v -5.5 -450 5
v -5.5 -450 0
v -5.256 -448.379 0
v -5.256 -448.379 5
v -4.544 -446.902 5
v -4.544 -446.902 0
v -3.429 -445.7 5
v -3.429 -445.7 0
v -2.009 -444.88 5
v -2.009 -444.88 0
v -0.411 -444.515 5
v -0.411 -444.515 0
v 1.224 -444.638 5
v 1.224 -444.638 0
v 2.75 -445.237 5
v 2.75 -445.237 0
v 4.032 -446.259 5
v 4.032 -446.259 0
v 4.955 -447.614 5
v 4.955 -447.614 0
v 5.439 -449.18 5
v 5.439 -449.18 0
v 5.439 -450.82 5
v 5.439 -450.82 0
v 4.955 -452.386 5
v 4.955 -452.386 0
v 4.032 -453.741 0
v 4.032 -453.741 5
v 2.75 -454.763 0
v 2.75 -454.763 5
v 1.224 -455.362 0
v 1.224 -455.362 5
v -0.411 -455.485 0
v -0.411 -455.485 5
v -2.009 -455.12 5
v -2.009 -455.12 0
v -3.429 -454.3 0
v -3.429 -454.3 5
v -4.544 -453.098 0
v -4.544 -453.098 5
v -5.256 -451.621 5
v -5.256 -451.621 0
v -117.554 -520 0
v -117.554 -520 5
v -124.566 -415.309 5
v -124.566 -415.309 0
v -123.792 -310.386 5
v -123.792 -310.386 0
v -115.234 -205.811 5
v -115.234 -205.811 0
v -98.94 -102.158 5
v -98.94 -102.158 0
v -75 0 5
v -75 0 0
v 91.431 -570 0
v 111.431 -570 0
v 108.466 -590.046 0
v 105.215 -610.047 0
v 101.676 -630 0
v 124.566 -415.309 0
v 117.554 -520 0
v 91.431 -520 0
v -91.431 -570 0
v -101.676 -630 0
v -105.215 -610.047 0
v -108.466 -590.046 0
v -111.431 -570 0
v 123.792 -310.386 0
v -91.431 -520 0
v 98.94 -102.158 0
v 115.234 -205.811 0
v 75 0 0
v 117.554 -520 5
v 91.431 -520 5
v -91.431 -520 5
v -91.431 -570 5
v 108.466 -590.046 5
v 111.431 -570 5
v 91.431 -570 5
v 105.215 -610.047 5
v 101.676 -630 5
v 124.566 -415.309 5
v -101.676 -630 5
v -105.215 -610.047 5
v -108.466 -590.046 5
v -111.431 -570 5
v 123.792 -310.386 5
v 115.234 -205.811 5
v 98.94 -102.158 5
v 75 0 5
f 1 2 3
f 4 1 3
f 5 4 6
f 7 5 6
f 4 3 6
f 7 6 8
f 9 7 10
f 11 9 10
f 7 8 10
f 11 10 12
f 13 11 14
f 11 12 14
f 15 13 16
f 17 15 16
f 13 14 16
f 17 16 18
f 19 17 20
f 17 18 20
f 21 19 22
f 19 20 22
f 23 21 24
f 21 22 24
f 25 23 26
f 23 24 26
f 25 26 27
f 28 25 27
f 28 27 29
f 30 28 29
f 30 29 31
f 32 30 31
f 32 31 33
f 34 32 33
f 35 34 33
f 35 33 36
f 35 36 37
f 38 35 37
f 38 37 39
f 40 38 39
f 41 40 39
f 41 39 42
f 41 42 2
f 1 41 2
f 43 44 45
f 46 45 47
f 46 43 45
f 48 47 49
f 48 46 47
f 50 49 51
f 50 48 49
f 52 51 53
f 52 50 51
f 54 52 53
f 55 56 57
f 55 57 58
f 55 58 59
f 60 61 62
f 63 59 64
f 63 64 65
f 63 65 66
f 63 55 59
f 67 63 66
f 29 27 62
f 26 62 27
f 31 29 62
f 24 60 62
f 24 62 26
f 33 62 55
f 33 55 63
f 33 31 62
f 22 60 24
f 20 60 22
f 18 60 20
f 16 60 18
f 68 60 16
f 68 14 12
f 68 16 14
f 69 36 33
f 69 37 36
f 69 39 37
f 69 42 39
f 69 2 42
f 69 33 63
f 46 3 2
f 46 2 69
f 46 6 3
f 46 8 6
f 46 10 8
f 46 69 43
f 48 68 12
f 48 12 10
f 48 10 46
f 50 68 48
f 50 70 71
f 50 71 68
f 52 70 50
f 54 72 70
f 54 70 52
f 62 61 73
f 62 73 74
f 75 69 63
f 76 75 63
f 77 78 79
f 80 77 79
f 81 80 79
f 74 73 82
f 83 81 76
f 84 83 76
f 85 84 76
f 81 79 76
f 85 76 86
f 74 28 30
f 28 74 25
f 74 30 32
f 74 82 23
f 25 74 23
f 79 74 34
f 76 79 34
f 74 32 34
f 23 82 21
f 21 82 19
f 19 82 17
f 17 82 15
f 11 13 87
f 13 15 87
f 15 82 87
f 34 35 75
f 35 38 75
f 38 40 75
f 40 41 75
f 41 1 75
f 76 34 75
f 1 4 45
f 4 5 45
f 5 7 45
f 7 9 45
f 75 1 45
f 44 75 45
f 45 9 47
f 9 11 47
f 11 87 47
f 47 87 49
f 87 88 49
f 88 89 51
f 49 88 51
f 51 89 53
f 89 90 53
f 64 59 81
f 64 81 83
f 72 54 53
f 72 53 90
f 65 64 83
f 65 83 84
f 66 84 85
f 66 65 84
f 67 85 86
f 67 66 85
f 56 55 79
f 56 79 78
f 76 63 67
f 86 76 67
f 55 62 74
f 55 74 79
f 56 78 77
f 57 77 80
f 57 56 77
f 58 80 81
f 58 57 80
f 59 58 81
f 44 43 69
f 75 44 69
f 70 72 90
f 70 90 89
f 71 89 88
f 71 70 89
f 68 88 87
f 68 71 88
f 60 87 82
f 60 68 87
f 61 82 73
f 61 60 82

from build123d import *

# Parameters (mm, degrees)
BOSS_EXTRUDE1_DEPTH = 5
SKETCH3_R           = 5.5
CUT_EXTRUDE1_DEPTH  = 1008.818415992
SKETCH4_W           = 203.352119636
SKETCH4_H           = 409.958390473
CUT_EXTRUDE2_DEPTH  = 1008.818415992


with BuildPart() as part:
    # Sketch2 → Boss-Extrude1 (new body)
    with BuildSketch(Plane.XY):
        with BuildLine():
            Line((-75, 0), (75, 0))
            ThreePointArc((75, 0), (125.183748831, -378.01295639), (72.466338168, -755.680903745))
            Line((72.466338168, -755.680903745), (4.813443083, -996.353057902))
            ThreePointArc((4.813443083, -996.353057902), (3.01949586, -998.985303596), (0, -1000))
            ThreePointArc((0, -1000), (-3.01949586, -998.985303596), (-4.813443083, -996.353057902))
            Line((-4.813443083, -996.353057902), (-72.466338168, -755.680903745))
            ThreePointArc((-72.466338168, -755.680903745), (-125.183748831, -378.01295639), (-75, 0))
        make_face()
    extrude(amount=BOSS_EXTRUDE1_DEPTH)

    # Sketch3 → Cut-Extrude1 (cut, through all)
    with BuildSketch(Plane(origin=(0, 0, 0), x_dir=(-1, 0, 0), z_dir=(0, 0, -1))):
        with Locations((0, -450)):
            Circle(SKETCH3_R)
    extrude(amount=-CUT_EXTRUDE1_DEPTH, mode=Mode.SUBTRACT)

    # Sketch4 → Cut-Extrude2 (cut, through all)
    with BuildSketch(Plane(origin=(0, 0, 0), x_dir=(-1, 0, 0), z_dir=(0, 0, -1))):
        with BuildLine():
            Line((-117.553772729, -520), (-91.431313106, -520))
            Line((-91.431313106, -520), (-91.431313106, -570))
            Line((-91.431313106, -570), (-111.431313106, -570))
            ThreePointArc((-111.431313106, -570), (-125.443374502, -546.340920484), (-117.553772729, -520))
        make_face()
        with BuildLine():
            Line((117.553772729, -520), (91.431313106, -520))
            Line((91.431313106, -520), (91.431313106, -570))
            Line((91.431313106, -570), (111.431313106, -570))
            ThreePointArc((111.431313106, -570), (125.443374502, -546.340920484), (117.553772729, -520))
        make_face()
        with Locations((0, -834.979195237)):
            Rectangle(SKETCH4_W, SKETCH4_H)
    extrude(amount=-CUT_EXTRUDE2_DEPTH, mode=Mode.SUBTRACT)


solid = part.part
